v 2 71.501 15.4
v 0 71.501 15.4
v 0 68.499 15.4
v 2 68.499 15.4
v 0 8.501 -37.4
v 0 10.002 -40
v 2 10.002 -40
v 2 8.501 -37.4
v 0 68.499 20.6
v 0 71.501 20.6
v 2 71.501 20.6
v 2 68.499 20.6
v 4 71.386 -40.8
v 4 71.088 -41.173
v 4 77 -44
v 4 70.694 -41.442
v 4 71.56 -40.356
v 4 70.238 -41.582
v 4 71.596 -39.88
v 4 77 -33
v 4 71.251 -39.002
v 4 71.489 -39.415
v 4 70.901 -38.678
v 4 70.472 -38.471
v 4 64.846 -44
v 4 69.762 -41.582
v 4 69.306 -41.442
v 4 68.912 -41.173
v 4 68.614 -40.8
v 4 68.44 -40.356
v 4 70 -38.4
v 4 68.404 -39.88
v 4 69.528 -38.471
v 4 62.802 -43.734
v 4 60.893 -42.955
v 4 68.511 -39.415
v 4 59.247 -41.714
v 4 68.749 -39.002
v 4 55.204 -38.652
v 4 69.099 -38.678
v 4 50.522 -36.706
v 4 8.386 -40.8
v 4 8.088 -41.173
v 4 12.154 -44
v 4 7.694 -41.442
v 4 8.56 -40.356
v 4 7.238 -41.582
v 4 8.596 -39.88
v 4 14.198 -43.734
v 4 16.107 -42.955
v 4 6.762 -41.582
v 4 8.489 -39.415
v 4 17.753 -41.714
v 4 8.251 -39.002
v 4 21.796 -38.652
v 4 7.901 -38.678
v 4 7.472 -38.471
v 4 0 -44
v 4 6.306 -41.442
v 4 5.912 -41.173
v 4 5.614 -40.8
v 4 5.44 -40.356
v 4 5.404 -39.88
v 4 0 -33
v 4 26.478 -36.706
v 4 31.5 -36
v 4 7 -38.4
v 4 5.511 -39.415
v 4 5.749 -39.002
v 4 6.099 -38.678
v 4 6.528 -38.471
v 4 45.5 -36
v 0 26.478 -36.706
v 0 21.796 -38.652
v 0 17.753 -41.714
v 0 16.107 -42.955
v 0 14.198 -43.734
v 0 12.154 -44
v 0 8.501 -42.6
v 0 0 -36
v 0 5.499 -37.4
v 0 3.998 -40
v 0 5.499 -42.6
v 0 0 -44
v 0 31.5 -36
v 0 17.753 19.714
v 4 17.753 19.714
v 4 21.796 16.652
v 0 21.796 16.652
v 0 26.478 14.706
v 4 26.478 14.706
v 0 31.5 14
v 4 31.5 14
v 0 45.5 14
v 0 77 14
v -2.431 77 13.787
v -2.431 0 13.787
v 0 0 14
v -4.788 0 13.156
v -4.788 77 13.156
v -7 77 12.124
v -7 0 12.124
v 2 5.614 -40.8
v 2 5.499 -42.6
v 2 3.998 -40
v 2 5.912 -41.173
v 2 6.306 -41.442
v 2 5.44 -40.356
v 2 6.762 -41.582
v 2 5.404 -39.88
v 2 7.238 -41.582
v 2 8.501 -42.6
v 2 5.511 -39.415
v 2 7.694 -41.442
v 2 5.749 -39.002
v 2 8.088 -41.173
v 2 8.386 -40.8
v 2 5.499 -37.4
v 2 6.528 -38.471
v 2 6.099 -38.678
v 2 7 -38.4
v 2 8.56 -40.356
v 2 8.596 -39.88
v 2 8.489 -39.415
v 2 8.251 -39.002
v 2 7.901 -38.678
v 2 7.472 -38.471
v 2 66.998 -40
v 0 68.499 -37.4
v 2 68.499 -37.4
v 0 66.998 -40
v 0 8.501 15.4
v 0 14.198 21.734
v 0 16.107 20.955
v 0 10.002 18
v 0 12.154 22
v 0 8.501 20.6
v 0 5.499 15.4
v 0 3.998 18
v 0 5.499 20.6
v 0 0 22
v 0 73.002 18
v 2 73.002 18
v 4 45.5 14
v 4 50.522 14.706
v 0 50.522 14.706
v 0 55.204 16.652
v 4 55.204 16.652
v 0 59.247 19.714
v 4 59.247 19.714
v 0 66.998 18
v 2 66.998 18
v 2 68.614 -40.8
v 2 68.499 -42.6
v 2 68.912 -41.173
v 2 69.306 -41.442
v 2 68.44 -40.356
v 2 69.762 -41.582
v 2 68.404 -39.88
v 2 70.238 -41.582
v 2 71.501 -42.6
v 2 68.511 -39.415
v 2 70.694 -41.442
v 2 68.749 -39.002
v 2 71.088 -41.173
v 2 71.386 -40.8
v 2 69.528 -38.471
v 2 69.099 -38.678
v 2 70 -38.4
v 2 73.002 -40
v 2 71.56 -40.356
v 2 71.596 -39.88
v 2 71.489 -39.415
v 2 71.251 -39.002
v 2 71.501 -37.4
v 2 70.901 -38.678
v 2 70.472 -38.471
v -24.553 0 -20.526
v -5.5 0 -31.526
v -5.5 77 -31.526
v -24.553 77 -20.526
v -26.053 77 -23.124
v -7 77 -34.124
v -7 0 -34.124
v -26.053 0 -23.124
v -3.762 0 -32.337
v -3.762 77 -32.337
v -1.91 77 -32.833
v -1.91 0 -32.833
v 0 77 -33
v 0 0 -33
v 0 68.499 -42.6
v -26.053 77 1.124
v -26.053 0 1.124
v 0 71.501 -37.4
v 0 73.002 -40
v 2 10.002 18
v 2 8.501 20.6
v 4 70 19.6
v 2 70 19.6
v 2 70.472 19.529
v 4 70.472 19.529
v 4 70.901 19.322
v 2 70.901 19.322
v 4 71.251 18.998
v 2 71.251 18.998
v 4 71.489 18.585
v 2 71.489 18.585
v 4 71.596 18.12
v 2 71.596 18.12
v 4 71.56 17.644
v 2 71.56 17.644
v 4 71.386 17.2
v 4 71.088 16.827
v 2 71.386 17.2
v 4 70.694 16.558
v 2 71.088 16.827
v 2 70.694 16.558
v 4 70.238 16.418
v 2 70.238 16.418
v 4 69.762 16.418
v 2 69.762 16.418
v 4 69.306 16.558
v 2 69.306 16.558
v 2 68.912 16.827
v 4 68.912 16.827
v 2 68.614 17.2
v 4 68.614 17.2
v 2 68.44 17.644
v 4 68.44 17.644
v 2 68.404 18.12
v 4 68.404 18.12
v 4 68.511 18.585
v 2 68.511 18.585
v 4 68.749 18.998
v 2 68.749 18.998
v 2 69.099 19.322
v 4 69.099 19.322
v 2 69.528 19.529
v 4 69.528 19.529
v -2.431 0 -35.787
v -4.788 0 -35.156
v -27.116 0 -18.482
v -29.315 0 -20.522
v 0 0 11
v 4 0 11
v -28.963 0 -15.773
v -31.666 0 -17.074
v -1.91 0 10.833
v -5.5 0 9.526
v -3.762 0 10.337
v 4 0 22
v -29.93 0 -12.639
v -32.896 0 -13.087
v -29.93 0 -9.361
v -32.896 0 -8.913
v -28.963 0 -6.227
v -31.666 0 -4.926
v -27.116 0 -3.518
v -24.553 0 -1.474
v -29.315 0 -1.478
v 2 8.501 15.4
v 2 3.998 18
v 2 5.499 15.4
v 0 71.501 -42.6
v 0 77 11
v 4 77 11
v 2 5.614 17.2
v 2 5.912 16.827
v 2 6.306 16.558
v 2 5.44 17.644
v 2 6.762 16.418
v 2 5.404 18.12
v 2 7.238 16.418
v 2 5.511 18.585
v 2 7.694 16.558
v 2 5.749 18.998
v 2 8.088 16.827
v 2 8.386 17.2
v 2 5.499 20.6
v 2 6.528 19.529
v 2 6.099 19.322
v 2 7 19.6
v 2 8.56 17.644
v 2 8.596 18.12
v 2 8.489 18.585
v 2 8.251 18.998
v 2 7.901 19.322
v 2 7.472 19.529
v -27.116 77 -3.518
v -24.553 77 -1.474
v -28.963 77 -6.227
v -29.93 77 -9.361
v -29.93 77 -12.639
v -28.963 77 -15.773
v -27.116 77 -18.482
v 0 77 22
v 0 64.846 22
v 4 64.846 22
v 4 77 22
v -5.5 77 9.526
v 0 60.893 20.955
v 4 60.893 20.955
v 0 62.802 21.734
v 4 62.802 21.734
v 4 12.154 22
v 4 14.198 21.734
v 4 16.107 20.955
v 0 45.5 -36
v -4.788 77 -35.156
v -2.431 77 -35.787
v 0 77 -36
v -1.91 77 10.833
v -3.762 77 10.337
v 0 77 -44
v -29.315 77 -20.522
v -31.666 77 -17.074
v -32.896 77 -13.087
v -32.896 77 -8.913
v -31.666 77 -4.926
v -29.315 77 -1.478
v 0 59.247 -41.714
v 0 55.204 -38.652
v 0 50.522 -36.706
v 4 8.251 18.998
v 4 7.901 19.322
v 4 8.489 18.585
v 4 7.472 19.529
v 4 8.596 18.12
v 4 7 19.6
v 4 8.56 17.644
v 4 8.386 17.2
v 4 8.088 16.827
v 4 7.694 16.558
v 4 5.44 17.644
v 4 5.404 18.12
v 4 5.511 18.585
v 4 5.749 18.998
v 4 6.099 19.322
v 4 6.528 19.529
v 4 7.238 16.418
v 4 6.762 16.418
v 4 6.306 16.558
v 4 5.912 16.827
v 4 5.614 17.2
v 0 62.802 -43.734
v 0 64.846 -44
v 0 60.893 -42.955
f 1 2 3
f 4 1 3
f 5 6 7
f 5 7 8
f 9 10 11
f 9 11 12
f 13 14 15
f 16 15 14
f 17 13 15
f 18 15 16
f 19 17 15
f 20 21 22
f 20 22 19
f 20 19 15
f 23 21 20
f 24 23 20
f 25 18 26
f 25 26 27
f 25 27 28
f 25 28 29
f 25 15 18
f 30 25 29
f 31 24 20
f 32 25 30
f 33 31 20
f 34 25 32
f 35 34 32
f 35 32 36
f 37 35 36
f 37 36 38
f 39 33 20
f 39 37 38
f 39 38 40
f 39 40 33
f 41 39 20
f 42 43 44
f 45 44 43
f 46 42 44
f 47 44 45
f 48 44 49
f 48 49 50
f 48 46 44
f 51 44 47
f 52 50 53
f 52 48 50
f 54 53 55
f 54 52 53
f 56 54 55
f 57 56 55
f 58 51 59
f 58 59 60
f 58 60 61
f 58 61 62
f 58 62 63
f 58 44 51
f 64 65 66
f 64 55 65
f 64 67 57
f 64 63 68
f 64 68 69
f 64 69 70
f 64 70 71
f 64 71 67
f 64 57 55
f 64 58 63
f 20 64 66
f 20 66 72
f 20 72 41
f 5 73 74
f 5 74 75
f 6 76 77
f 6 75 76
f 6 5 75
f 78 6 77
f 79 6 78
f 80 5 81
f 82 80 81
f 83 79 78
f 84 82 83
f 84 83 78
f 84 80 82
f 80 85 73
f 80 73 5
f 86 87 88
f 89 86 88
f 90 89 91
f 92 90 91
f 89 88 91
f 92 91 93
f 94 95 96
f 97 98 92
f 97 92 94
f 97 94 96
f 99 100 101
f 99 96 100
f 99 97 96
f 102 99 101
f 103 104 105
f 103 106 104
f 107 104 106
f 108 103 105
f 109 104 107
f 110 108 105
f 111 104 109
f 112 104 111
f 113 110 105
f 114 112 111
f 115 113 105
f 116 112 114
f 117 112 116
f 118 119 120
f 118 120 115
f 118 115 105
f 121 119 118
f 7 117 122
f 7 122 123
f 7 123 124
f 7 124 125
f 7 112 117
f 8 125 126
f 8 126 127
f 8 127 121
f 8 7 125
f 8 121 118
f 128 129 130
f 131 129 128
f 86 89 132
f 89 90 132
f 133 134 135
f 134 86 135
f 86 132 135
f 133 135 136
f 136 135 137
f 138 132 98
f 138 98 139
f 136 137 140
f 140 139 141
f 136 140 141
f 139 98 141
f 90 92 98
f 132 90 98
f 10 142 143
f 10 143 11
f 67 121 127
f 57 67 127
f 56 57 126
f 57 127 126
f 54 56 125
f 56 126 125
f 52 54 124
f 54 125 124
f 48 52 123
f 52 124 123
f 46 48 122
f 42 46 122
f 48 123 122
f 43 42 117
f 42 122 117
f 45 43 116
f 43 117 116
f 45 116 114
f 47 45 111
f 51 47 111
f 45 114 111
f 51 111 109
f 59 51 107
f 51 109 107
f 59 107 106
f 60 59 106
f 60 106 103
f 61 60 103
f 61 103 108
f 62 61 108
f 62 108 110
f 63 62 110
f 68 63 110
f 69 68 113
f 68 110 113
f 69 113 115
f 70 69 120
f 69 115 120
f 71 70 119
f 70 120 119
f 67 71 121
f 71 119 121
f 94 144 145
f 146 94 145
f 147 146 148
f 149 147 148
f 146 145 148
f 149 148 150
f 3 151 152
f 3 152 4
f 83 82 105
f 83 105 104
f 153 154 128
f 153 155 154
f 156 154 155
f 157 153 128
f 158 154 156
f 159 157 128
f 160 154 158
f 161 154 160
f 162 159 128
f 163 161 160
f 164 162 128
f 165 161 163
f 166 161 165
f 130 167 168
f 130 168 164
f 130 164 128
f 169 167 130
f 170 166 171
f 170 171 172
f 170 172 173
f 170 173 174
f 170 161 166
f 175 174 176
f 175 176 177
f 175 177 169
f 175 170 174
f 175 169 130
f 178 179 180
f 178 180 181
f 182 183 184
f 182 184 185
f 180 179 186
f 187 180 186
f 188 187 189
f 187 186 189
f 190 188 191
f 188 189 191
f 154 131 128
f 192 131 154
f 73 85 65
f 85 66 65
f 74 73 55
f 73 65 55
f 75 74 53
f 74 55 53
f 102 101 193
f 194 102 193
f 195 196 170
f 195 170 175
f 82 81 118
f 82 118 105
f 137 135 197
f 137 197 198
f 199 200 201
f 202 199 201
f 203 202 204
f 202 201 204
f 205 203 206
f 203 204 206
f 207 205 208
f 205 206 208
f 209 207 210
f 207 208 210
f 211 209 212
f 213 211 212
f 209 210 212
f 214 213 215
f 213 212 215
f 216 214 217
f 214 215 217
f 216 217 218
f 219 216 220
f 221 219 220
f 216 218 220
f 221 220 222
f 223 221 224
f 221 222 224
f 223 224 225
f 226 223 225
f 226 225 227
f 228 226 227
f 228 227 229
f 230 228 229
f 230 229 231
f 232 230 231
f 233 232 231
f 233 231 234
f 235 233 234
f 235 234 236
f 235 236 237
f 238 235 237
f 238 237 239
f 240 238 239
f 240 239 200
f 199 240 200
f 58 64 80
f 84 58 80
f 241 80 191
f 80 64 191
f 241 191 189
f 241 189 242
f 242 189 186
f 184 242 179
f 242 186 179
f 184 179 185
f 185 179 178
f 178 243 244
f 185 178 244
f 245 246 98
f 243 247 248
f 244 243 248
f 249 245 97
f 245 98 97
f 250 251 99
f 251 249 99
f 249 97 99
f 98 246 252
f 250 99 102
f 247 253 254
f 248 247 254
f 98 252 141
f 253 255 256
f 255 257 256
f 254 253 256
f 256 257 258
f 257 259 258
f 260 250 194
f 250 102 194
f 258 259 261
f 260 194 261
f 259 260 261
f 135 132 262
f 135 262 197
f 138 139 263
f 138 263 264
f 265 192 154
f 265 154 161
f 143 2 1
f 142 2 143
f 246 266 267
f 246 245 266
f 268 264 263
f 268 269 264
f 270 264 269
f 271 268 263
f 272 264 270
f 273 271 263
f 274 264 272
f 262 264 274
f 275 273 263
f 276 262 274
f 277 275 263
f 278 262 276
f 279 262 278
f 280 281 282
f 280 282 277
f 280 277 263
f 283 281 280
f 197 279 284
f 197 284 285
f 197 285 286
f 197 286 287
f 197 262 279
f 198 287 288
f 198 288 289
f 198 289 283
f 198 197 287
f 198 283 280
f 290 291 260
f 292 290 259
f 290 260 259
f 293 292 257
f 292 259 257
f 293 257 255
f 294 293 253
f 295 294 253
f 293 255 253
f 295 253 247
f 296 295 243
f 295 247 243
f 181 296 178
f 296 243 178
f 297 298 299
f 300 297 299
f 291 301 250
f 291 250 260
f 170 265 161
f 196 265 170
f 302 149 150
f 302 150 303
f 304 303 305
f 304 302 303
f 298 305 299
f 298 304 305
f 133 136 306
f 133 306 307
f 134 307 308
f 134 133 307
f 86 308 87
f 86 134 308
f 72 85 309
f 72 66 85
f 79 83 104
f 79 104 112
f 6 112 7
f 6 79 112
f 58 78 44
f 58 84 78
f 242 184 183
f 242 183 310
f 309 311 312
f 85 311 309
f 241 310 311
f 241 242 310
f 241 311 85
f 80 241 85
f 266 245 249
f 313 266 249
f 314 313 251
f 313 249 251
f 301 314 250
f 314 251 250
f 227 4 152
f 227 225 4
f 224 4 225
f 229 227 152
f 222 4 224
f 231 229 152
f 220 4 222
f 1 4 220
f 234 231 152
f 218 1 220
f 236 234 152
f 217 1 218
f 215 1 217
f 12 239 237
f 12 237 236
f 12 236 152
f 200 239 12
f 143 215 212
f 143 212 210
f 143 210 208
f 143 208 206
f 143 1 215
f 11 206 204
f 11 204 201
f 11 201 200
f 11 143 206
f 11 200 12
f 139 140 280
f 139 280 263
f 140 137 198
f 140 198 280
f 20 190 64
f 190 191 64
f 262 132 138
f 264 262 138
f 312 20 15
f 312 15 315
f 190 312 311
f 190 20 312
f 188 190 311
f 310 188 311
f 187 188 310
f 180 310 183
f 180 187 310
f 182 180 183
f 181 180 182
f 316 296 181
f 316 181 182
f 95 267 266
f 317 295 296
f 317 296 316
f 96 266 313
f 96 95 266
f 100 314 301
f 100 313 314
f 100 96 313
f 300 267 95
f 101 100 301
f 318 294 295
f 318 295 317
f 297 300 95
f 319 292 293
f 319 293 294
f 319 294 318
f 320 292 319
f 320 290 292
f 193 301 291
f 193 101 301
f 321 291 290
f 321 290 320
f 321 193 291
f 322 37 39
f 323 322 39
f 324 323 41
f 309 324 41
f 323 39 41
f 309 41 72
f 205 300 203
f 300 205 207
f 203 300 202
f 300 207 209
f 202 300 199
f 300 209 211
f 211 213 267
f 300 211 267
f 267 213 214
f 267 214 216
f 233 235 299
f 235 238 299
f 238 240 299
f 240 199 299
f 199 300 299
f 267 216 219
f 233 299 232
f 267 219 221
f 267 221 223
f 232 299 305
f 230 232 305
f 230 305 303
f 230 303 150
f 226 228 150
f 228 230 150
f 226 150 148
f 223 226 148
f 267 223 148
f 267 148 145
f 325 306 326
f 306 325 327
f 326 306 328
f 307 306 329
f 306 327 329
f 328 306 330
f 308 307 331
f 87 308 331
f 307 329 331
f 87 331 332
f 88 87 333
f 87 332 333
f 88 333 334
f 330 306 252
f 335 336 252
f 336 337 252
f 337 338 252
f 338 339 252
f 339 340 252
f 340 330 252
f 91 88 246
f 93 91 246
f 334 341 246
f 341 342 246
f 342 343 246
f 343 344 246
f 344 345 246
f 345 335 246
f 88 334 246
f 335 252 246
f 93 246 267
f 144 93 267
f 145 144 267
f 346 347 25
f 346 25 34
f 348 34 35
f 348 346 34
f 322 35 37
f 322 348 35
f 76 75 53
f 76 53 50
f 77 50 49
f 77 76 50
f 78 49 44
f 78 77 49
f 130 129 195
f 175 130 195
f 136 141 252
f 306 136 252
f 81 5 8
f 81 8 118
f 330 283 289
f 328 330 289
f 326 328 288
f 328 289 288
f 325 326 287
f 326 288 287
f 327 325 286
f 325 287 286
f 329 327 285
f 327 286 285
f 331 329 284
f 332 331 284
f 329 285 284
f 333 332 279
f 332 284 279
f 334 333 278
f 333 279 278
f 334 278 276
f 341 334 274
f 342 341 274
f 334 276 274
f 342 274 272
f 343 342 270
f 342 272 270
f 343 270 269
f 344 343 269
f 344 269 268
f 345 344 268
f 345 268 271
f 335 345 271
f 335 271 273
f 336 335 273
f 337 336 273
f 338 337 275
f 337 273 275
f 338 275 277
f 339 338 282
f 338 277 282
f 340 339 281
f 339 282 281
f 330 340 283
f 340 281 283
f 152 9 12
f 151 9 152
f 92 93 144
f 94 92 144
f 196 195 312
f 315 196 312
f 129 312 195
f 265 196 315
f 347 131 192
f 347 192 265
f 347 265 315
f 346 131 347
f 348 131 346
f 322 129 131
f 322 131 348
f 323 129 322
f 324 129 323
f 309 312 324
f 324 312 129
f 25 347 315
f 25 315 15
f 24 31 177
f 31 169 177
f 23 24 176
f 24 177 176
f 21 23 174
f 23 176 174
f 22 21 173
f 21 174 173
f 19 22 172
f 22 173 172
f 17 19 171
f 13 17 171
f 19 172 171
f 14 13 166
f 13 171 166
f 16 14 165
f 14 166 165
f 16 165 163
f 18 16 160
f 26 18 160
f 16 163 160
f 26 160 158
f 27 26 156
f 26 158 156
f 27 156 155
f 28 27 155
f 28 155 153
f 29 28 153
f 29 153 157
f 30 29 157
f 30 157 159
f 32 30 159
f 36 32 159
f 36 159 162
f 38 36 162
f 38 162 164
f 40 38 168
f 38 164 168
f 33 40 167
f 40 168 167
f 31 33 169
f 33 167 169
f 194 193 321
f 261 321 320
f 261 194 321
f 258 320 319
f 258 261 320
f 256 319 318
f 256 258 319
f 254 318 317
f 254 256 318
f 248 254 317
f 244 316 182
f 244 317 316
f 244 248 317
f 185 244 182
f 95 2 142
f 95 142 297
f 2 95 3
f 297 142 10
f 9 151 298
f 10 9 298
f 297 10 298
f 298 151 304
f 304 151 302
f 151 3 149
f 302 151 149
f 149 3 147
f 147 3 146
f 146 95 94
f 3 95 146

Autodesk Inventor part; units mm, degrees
ref_plane "YZ Plane" through (0, 0, 0) normal (1, 0, 0) x (0, 1, 0)
ref_plane "XZ Plane" through (0, 0, 0) normal (0, 1, 0) x (-1, 0, 0)
ref_plane "XY Plane" through (0, 0, 0) normal (0, 0, 1) x (1, 0, 0)
sketch "Эскиз1" plane through (0, 0, 0) normal (0, 1, 0) x (-1, 0, 0)
  circle A0 centre (0, 0) radius 11
  circle A1 centre (0, -22) radius 11
  circle A2 centre (19.0526, -11) radius 11
  line L0 (0, 0) -> (7, 12.1244)
  line L1 (0, 0) -> (14, 0) construction
  line L2 (0, -22) -> (7, -34.1244)
  line L3 (0, -22) -> (14, -22) construction
  line L4 (5.5, 9.5263) -> (24.5526, -1.4737)
  line L5 (5.5, -31.5263) -> (24.5526, -20.5263)
  circle A3 centre (0, 0) radius 14
  circle A4 centre (0, -22) radius 14
  circle A5 centre (19.0526, -11) radius 14
  line L6 (7, 12.1244) -> (26.0526, 1.1244)
  line L7 (7, -34.1244) -> (26.0526, -23.1244)
  line L8 (-14, 0) -> (-9, 0)
  line L9 (0, 11) -> (8.6603, 11) construction
  line L10 (0, 14) -> (-9, 14)
  line L11 (0, 11) -> (-9, 11)
  line L12 (0, -36) -> (-9, -36)
  line L13 (0, -33) -> (-9, -33)
  line L14 (-9, -36) -> (-9, 14)
  line L15 (-9, 11) -> (-6, 11)
  line L16 (-6, 11) -> (-6, 22)
  line L17 (-6, 22) -> (-9, 22)
  line L18 (-9, 22) -> (-9, 11)
  line L19 (-9, -33) -> (-6, -33)
  line L20 (-6, -33) -> (-6, -44)
  line L21 (-6, -44) -> (-9, -44)
  line L22 (-9, -44) -> (-9, -33)
  line L23 (-9, 11) -> (-4, 11)
  line L24 (-4, 11) -> (0, 11)
  line L25 (0, 11) -> (0, 22)
  line L26 (0, 22) -> (-4, 22)
  line L27 (-4, 22) -> (-4, 11)
  line L28 (-9, -33) -> (-4, -33)
  line L29 (-4, -33) -> (0, -33)
  line L30 (0, -33) -> (0, -44)
  line L31 (0, -44) -> (-4, -44)
  line L32 (-4, -44) -> (-4, -33)
  line L33 (-4, 11) -> (-4, -36)
  point P0 (-6, -36)
  point P1 (-6, 14)
  dimension "d10" = 22
  dimension "d12" = 22
  dimension "d13" = 14
  dimension "d14" = 60
  dimension "d15" = 14
  dimension "d16" = 60
  dimension "d17" = 28
  dimension "d20" = 9
  dimension "d21" = 3
  dimension "d22" = 11
  dimension "d23" = 3
  dimension "d24" = 11
  dimension "d53" = 5
  dimension "d54" = 4
  dimension "d55" = 5
extrude "Выдавливание1" add sketch "Эскиз1" along normal blind 77 contours A0 L25 A3 L0 | L0 A3 L4 | L11 L27 A3 L25 | L6 A5 L4 A3 | A3 L27 L10 | L10 L27 L26 L25 | A5 L5 A2 L4 | L7 A4 L5 A5 | A4 L30 A1 L2 | L2 L5 A4 | L12 L32 A4 | L30 L31 L32 L12 | A4 L32 L13 L30
sketch "Эскиз6" plane through (4, 0, -33) normal (1, 0, 0) x (0, 0, -1)
  line L0 (11, 0) -> (11, 77) projected
  line L1 (11, 0) -> (11, 31.5)
  line L2 (11, 77) -> (11, 45.5)
  line L3 (-47, 0) -> (-55, 0) projected
  line L4 (-55, 0) -> (-55, 31.5)
  line L5 (-55, 0) -> (-55, 77) projected
  line L6 (-55, 77) -> (-55, 45.5)
  line L7 (-47, 0) -> (-47, 77) projected
  line L8 (-55, 45.5) -> (-47, 45.5)
  line L9 (-47, 45.5) -> (-47, 31.5)
  line L10 (-47, 31.5) -> (-55, 31.5)
  line L11 (-55, 31.5) -> (-55, 45.5)
  line L12 (3, 0) -> (3, 77) projected
  line L13 (11, 31.5) -> (3, 31.5)
  line L14 (3, 31.5) -> (3, 45.5)
  line L15 (3, 45.5) -> (11, 45.5)
  line L16 (11, 45.5) -> (11, 31.5)
  arc A0 (3, 31.5) -> (11, 15.75) centre (22.9984, 31.7512) ccw
  arc A1 (11, 61.25) -> (3, 45.5) centre (22.9984, 45.2488) ccw
  arc A2 (-47, 45.5) -> (-55, 61.25) centre (-66.9984, 45.2488) ccw
  arc A3 (-55, 15.75) -> (-47, 31.5) centre (-66.9984, 31.7512) ccw
  point P0 (-33, 0)
  point P1 (3, 31.5)
  point P2 (11, 15.75)
  dimension "d56" = 31.5
  dimension "d57" = 31.5
  dimension "d58" = 31.5
  dimension "d59" = 31.5
  dimension "d60" = 20
  dimension "d61" = 20
  dimension "d62" = 20
  dimension "d63" = 20
extrude "Выдавливание5" cut sketch "Эскиз6" against normal blind 4 contours A0 L13 L0 | L13 L12 L15 L0 | L15 A1 L0 | L10 L5 L8 L7 | A3 L4 L10 | L8 L5 A2
fillet "Сопряжение2" radius 8 4 edges at (2, 15.75, -44) (2, 61.25, -44) (2, 61.25, 22) (2, 15.75, 22)
sketch "Эскиз7" plane through (0, 0, 14) normal (-1, 0, 0) x (0, 0, 1)
  line L0 (8, 0) -> (8, 12.1537) projected
  line L1 (8, 0) -> (4, 0)
  line L2 (8, 7) -> (8, 0)
  line L3 (4, 7) -> (-54, 7)
  line L4 (-54, 7) -> (-54, 70)
  line L5 (-54, 70) -> (4, 70)
  line L6 (4, 70) -> (4, 7)
  line L7 (4, 7) -> (1.4, 7)
  line L8 (-54, 70) -> (-51.4, 70)
  line L9 (1.4, 7) -> (-51.4, 7)
  line L10 (-51.4, 7) -> (-51.4, 70)
  line L11 (-51.4, 70) -> (1.4, 70)
  line L12 (1.4, 70) -> (1.4, 7)
  line L13 (1.4, 8.5011) -> (4, 10.0022)
  line L14 (4, 10.0022) -> (6.6, 8.5011)
  line L15 (6.6, 8.5011) -> (6.6, 5.4989)
  line L16 (6.6, 5.4989) -> (4, 3.9978)
  line L17 (4, 3.9978) -> (1.4, 5.4989)
  line L18 (1.4, 5.4989) -> (1.4, 8.5011)
  line L19 (-51.4, 5.4989) -> (-54, 3.9978)
  line L20 (-54, 3.9978) -> (-56.6, 5.4989)
  line L21 (-56.6, 5.4989) -> (-56.6, 8.5011)
  line L22 (-56.6, 8.5011) -> (-54, 10.0022)
  line L23 (-54, 10.0022) -> (-51.4, 8.5011)
  line L24 (-51.4, 8.5011) -> (-51.4, 5.4989)
  line L25 (-51.4, 68.4989) -> (-54, 66.9978)
  line L26 (-54, 66.9978) -> (-56.6, 68.4989)
  line L27 (-56.6, 68.4989) -> (-56.6, 71.5011)
  line L28 (-56.6, 71.5011) -> (-54, 73.0022)
  line L29 (-54, 73.0022) -> (-51.4, 71.5011)
  line L30 (-51.4, 71.5011) -> (-51.4, 68.4989)
  line L31 (1.4, 71.5011) -> (4, 73.0022)
  line L32 (4, 73.0022) -> (6.6, 71.5011)
  line L33 (6.6, 71.5011) -> (6.6, 68.4989)
  line L34 (6.6, 68.4989) -> (4, 66.9978)
  line L35 (4, 66.9978) -> (1.4, 68.4989)
  line L36 (1.4, 68.4989) -> (1.4, 71.5011)
  point P0 (-14, 0)
  point P1 (1.4, 68.4989)
  point P2 (1.4, 8.5011)
  dimension "d69" = 58
  dimension "d70" = 63
  dimension "d71" = 2.6
  dimension "d72" = 2.6
extrude "Выдавливание6" cut sketch "Эскиз7" against normal blind 2 contours L6 L14 L15 L16 L17 L18 L3 | L3 L12 L13 L6 | L24 L19 L20 L21 L22 L4 L3 | L3 L4 L23 L10 | L35 L12 L5 L6 | L6 L5 L36 L31 L32 L33 L34 | L25 L4 L5 L10 | L26 L27 L28 L29 L30 L5 L4
sketch "Эскиз8" plane through (2, 0, 14) normal (-1, 0, 0) x (0, 0, 1)
  line L0 (4, 7) -> (-54, 7)
  line L1 (-54, 7) -> (-54, 70)
  line L2 (-54, 70) -> (4, 70)
  line L3 (4, 70) -> (4, 7)
  circle A0 centre (4, 7) radius 1.6
  circle A1 centre (-54, 7) radius 1.6
  circle A2 centre (-54, 70) radius 1.6
  circle A3 centre (4, 70) radius 1.6
  point P0 (-14, 0)
  dimension "d75" = 3.2
  dimension "d76" = 3.2
  dimension "d77" = 3.2
  dimension "d78" = 3.2
extrude "Выдавливание7" cut sketch "Эскиз8" against normal blind 2 contours A1 L1 L0 | L0 L1 A1 | A0 L3 L0 | L0 L3 A0 | A2 L2 L1 | L1 L2 A2 | A3 L2 L3 | L3 L2 A3
sketch "Эскиз9" plane through (0, 77, 0) normal (0, 1, 0) x (1, 0, 0)
  point P0 (0, 0)
properties part number "battery_1"
